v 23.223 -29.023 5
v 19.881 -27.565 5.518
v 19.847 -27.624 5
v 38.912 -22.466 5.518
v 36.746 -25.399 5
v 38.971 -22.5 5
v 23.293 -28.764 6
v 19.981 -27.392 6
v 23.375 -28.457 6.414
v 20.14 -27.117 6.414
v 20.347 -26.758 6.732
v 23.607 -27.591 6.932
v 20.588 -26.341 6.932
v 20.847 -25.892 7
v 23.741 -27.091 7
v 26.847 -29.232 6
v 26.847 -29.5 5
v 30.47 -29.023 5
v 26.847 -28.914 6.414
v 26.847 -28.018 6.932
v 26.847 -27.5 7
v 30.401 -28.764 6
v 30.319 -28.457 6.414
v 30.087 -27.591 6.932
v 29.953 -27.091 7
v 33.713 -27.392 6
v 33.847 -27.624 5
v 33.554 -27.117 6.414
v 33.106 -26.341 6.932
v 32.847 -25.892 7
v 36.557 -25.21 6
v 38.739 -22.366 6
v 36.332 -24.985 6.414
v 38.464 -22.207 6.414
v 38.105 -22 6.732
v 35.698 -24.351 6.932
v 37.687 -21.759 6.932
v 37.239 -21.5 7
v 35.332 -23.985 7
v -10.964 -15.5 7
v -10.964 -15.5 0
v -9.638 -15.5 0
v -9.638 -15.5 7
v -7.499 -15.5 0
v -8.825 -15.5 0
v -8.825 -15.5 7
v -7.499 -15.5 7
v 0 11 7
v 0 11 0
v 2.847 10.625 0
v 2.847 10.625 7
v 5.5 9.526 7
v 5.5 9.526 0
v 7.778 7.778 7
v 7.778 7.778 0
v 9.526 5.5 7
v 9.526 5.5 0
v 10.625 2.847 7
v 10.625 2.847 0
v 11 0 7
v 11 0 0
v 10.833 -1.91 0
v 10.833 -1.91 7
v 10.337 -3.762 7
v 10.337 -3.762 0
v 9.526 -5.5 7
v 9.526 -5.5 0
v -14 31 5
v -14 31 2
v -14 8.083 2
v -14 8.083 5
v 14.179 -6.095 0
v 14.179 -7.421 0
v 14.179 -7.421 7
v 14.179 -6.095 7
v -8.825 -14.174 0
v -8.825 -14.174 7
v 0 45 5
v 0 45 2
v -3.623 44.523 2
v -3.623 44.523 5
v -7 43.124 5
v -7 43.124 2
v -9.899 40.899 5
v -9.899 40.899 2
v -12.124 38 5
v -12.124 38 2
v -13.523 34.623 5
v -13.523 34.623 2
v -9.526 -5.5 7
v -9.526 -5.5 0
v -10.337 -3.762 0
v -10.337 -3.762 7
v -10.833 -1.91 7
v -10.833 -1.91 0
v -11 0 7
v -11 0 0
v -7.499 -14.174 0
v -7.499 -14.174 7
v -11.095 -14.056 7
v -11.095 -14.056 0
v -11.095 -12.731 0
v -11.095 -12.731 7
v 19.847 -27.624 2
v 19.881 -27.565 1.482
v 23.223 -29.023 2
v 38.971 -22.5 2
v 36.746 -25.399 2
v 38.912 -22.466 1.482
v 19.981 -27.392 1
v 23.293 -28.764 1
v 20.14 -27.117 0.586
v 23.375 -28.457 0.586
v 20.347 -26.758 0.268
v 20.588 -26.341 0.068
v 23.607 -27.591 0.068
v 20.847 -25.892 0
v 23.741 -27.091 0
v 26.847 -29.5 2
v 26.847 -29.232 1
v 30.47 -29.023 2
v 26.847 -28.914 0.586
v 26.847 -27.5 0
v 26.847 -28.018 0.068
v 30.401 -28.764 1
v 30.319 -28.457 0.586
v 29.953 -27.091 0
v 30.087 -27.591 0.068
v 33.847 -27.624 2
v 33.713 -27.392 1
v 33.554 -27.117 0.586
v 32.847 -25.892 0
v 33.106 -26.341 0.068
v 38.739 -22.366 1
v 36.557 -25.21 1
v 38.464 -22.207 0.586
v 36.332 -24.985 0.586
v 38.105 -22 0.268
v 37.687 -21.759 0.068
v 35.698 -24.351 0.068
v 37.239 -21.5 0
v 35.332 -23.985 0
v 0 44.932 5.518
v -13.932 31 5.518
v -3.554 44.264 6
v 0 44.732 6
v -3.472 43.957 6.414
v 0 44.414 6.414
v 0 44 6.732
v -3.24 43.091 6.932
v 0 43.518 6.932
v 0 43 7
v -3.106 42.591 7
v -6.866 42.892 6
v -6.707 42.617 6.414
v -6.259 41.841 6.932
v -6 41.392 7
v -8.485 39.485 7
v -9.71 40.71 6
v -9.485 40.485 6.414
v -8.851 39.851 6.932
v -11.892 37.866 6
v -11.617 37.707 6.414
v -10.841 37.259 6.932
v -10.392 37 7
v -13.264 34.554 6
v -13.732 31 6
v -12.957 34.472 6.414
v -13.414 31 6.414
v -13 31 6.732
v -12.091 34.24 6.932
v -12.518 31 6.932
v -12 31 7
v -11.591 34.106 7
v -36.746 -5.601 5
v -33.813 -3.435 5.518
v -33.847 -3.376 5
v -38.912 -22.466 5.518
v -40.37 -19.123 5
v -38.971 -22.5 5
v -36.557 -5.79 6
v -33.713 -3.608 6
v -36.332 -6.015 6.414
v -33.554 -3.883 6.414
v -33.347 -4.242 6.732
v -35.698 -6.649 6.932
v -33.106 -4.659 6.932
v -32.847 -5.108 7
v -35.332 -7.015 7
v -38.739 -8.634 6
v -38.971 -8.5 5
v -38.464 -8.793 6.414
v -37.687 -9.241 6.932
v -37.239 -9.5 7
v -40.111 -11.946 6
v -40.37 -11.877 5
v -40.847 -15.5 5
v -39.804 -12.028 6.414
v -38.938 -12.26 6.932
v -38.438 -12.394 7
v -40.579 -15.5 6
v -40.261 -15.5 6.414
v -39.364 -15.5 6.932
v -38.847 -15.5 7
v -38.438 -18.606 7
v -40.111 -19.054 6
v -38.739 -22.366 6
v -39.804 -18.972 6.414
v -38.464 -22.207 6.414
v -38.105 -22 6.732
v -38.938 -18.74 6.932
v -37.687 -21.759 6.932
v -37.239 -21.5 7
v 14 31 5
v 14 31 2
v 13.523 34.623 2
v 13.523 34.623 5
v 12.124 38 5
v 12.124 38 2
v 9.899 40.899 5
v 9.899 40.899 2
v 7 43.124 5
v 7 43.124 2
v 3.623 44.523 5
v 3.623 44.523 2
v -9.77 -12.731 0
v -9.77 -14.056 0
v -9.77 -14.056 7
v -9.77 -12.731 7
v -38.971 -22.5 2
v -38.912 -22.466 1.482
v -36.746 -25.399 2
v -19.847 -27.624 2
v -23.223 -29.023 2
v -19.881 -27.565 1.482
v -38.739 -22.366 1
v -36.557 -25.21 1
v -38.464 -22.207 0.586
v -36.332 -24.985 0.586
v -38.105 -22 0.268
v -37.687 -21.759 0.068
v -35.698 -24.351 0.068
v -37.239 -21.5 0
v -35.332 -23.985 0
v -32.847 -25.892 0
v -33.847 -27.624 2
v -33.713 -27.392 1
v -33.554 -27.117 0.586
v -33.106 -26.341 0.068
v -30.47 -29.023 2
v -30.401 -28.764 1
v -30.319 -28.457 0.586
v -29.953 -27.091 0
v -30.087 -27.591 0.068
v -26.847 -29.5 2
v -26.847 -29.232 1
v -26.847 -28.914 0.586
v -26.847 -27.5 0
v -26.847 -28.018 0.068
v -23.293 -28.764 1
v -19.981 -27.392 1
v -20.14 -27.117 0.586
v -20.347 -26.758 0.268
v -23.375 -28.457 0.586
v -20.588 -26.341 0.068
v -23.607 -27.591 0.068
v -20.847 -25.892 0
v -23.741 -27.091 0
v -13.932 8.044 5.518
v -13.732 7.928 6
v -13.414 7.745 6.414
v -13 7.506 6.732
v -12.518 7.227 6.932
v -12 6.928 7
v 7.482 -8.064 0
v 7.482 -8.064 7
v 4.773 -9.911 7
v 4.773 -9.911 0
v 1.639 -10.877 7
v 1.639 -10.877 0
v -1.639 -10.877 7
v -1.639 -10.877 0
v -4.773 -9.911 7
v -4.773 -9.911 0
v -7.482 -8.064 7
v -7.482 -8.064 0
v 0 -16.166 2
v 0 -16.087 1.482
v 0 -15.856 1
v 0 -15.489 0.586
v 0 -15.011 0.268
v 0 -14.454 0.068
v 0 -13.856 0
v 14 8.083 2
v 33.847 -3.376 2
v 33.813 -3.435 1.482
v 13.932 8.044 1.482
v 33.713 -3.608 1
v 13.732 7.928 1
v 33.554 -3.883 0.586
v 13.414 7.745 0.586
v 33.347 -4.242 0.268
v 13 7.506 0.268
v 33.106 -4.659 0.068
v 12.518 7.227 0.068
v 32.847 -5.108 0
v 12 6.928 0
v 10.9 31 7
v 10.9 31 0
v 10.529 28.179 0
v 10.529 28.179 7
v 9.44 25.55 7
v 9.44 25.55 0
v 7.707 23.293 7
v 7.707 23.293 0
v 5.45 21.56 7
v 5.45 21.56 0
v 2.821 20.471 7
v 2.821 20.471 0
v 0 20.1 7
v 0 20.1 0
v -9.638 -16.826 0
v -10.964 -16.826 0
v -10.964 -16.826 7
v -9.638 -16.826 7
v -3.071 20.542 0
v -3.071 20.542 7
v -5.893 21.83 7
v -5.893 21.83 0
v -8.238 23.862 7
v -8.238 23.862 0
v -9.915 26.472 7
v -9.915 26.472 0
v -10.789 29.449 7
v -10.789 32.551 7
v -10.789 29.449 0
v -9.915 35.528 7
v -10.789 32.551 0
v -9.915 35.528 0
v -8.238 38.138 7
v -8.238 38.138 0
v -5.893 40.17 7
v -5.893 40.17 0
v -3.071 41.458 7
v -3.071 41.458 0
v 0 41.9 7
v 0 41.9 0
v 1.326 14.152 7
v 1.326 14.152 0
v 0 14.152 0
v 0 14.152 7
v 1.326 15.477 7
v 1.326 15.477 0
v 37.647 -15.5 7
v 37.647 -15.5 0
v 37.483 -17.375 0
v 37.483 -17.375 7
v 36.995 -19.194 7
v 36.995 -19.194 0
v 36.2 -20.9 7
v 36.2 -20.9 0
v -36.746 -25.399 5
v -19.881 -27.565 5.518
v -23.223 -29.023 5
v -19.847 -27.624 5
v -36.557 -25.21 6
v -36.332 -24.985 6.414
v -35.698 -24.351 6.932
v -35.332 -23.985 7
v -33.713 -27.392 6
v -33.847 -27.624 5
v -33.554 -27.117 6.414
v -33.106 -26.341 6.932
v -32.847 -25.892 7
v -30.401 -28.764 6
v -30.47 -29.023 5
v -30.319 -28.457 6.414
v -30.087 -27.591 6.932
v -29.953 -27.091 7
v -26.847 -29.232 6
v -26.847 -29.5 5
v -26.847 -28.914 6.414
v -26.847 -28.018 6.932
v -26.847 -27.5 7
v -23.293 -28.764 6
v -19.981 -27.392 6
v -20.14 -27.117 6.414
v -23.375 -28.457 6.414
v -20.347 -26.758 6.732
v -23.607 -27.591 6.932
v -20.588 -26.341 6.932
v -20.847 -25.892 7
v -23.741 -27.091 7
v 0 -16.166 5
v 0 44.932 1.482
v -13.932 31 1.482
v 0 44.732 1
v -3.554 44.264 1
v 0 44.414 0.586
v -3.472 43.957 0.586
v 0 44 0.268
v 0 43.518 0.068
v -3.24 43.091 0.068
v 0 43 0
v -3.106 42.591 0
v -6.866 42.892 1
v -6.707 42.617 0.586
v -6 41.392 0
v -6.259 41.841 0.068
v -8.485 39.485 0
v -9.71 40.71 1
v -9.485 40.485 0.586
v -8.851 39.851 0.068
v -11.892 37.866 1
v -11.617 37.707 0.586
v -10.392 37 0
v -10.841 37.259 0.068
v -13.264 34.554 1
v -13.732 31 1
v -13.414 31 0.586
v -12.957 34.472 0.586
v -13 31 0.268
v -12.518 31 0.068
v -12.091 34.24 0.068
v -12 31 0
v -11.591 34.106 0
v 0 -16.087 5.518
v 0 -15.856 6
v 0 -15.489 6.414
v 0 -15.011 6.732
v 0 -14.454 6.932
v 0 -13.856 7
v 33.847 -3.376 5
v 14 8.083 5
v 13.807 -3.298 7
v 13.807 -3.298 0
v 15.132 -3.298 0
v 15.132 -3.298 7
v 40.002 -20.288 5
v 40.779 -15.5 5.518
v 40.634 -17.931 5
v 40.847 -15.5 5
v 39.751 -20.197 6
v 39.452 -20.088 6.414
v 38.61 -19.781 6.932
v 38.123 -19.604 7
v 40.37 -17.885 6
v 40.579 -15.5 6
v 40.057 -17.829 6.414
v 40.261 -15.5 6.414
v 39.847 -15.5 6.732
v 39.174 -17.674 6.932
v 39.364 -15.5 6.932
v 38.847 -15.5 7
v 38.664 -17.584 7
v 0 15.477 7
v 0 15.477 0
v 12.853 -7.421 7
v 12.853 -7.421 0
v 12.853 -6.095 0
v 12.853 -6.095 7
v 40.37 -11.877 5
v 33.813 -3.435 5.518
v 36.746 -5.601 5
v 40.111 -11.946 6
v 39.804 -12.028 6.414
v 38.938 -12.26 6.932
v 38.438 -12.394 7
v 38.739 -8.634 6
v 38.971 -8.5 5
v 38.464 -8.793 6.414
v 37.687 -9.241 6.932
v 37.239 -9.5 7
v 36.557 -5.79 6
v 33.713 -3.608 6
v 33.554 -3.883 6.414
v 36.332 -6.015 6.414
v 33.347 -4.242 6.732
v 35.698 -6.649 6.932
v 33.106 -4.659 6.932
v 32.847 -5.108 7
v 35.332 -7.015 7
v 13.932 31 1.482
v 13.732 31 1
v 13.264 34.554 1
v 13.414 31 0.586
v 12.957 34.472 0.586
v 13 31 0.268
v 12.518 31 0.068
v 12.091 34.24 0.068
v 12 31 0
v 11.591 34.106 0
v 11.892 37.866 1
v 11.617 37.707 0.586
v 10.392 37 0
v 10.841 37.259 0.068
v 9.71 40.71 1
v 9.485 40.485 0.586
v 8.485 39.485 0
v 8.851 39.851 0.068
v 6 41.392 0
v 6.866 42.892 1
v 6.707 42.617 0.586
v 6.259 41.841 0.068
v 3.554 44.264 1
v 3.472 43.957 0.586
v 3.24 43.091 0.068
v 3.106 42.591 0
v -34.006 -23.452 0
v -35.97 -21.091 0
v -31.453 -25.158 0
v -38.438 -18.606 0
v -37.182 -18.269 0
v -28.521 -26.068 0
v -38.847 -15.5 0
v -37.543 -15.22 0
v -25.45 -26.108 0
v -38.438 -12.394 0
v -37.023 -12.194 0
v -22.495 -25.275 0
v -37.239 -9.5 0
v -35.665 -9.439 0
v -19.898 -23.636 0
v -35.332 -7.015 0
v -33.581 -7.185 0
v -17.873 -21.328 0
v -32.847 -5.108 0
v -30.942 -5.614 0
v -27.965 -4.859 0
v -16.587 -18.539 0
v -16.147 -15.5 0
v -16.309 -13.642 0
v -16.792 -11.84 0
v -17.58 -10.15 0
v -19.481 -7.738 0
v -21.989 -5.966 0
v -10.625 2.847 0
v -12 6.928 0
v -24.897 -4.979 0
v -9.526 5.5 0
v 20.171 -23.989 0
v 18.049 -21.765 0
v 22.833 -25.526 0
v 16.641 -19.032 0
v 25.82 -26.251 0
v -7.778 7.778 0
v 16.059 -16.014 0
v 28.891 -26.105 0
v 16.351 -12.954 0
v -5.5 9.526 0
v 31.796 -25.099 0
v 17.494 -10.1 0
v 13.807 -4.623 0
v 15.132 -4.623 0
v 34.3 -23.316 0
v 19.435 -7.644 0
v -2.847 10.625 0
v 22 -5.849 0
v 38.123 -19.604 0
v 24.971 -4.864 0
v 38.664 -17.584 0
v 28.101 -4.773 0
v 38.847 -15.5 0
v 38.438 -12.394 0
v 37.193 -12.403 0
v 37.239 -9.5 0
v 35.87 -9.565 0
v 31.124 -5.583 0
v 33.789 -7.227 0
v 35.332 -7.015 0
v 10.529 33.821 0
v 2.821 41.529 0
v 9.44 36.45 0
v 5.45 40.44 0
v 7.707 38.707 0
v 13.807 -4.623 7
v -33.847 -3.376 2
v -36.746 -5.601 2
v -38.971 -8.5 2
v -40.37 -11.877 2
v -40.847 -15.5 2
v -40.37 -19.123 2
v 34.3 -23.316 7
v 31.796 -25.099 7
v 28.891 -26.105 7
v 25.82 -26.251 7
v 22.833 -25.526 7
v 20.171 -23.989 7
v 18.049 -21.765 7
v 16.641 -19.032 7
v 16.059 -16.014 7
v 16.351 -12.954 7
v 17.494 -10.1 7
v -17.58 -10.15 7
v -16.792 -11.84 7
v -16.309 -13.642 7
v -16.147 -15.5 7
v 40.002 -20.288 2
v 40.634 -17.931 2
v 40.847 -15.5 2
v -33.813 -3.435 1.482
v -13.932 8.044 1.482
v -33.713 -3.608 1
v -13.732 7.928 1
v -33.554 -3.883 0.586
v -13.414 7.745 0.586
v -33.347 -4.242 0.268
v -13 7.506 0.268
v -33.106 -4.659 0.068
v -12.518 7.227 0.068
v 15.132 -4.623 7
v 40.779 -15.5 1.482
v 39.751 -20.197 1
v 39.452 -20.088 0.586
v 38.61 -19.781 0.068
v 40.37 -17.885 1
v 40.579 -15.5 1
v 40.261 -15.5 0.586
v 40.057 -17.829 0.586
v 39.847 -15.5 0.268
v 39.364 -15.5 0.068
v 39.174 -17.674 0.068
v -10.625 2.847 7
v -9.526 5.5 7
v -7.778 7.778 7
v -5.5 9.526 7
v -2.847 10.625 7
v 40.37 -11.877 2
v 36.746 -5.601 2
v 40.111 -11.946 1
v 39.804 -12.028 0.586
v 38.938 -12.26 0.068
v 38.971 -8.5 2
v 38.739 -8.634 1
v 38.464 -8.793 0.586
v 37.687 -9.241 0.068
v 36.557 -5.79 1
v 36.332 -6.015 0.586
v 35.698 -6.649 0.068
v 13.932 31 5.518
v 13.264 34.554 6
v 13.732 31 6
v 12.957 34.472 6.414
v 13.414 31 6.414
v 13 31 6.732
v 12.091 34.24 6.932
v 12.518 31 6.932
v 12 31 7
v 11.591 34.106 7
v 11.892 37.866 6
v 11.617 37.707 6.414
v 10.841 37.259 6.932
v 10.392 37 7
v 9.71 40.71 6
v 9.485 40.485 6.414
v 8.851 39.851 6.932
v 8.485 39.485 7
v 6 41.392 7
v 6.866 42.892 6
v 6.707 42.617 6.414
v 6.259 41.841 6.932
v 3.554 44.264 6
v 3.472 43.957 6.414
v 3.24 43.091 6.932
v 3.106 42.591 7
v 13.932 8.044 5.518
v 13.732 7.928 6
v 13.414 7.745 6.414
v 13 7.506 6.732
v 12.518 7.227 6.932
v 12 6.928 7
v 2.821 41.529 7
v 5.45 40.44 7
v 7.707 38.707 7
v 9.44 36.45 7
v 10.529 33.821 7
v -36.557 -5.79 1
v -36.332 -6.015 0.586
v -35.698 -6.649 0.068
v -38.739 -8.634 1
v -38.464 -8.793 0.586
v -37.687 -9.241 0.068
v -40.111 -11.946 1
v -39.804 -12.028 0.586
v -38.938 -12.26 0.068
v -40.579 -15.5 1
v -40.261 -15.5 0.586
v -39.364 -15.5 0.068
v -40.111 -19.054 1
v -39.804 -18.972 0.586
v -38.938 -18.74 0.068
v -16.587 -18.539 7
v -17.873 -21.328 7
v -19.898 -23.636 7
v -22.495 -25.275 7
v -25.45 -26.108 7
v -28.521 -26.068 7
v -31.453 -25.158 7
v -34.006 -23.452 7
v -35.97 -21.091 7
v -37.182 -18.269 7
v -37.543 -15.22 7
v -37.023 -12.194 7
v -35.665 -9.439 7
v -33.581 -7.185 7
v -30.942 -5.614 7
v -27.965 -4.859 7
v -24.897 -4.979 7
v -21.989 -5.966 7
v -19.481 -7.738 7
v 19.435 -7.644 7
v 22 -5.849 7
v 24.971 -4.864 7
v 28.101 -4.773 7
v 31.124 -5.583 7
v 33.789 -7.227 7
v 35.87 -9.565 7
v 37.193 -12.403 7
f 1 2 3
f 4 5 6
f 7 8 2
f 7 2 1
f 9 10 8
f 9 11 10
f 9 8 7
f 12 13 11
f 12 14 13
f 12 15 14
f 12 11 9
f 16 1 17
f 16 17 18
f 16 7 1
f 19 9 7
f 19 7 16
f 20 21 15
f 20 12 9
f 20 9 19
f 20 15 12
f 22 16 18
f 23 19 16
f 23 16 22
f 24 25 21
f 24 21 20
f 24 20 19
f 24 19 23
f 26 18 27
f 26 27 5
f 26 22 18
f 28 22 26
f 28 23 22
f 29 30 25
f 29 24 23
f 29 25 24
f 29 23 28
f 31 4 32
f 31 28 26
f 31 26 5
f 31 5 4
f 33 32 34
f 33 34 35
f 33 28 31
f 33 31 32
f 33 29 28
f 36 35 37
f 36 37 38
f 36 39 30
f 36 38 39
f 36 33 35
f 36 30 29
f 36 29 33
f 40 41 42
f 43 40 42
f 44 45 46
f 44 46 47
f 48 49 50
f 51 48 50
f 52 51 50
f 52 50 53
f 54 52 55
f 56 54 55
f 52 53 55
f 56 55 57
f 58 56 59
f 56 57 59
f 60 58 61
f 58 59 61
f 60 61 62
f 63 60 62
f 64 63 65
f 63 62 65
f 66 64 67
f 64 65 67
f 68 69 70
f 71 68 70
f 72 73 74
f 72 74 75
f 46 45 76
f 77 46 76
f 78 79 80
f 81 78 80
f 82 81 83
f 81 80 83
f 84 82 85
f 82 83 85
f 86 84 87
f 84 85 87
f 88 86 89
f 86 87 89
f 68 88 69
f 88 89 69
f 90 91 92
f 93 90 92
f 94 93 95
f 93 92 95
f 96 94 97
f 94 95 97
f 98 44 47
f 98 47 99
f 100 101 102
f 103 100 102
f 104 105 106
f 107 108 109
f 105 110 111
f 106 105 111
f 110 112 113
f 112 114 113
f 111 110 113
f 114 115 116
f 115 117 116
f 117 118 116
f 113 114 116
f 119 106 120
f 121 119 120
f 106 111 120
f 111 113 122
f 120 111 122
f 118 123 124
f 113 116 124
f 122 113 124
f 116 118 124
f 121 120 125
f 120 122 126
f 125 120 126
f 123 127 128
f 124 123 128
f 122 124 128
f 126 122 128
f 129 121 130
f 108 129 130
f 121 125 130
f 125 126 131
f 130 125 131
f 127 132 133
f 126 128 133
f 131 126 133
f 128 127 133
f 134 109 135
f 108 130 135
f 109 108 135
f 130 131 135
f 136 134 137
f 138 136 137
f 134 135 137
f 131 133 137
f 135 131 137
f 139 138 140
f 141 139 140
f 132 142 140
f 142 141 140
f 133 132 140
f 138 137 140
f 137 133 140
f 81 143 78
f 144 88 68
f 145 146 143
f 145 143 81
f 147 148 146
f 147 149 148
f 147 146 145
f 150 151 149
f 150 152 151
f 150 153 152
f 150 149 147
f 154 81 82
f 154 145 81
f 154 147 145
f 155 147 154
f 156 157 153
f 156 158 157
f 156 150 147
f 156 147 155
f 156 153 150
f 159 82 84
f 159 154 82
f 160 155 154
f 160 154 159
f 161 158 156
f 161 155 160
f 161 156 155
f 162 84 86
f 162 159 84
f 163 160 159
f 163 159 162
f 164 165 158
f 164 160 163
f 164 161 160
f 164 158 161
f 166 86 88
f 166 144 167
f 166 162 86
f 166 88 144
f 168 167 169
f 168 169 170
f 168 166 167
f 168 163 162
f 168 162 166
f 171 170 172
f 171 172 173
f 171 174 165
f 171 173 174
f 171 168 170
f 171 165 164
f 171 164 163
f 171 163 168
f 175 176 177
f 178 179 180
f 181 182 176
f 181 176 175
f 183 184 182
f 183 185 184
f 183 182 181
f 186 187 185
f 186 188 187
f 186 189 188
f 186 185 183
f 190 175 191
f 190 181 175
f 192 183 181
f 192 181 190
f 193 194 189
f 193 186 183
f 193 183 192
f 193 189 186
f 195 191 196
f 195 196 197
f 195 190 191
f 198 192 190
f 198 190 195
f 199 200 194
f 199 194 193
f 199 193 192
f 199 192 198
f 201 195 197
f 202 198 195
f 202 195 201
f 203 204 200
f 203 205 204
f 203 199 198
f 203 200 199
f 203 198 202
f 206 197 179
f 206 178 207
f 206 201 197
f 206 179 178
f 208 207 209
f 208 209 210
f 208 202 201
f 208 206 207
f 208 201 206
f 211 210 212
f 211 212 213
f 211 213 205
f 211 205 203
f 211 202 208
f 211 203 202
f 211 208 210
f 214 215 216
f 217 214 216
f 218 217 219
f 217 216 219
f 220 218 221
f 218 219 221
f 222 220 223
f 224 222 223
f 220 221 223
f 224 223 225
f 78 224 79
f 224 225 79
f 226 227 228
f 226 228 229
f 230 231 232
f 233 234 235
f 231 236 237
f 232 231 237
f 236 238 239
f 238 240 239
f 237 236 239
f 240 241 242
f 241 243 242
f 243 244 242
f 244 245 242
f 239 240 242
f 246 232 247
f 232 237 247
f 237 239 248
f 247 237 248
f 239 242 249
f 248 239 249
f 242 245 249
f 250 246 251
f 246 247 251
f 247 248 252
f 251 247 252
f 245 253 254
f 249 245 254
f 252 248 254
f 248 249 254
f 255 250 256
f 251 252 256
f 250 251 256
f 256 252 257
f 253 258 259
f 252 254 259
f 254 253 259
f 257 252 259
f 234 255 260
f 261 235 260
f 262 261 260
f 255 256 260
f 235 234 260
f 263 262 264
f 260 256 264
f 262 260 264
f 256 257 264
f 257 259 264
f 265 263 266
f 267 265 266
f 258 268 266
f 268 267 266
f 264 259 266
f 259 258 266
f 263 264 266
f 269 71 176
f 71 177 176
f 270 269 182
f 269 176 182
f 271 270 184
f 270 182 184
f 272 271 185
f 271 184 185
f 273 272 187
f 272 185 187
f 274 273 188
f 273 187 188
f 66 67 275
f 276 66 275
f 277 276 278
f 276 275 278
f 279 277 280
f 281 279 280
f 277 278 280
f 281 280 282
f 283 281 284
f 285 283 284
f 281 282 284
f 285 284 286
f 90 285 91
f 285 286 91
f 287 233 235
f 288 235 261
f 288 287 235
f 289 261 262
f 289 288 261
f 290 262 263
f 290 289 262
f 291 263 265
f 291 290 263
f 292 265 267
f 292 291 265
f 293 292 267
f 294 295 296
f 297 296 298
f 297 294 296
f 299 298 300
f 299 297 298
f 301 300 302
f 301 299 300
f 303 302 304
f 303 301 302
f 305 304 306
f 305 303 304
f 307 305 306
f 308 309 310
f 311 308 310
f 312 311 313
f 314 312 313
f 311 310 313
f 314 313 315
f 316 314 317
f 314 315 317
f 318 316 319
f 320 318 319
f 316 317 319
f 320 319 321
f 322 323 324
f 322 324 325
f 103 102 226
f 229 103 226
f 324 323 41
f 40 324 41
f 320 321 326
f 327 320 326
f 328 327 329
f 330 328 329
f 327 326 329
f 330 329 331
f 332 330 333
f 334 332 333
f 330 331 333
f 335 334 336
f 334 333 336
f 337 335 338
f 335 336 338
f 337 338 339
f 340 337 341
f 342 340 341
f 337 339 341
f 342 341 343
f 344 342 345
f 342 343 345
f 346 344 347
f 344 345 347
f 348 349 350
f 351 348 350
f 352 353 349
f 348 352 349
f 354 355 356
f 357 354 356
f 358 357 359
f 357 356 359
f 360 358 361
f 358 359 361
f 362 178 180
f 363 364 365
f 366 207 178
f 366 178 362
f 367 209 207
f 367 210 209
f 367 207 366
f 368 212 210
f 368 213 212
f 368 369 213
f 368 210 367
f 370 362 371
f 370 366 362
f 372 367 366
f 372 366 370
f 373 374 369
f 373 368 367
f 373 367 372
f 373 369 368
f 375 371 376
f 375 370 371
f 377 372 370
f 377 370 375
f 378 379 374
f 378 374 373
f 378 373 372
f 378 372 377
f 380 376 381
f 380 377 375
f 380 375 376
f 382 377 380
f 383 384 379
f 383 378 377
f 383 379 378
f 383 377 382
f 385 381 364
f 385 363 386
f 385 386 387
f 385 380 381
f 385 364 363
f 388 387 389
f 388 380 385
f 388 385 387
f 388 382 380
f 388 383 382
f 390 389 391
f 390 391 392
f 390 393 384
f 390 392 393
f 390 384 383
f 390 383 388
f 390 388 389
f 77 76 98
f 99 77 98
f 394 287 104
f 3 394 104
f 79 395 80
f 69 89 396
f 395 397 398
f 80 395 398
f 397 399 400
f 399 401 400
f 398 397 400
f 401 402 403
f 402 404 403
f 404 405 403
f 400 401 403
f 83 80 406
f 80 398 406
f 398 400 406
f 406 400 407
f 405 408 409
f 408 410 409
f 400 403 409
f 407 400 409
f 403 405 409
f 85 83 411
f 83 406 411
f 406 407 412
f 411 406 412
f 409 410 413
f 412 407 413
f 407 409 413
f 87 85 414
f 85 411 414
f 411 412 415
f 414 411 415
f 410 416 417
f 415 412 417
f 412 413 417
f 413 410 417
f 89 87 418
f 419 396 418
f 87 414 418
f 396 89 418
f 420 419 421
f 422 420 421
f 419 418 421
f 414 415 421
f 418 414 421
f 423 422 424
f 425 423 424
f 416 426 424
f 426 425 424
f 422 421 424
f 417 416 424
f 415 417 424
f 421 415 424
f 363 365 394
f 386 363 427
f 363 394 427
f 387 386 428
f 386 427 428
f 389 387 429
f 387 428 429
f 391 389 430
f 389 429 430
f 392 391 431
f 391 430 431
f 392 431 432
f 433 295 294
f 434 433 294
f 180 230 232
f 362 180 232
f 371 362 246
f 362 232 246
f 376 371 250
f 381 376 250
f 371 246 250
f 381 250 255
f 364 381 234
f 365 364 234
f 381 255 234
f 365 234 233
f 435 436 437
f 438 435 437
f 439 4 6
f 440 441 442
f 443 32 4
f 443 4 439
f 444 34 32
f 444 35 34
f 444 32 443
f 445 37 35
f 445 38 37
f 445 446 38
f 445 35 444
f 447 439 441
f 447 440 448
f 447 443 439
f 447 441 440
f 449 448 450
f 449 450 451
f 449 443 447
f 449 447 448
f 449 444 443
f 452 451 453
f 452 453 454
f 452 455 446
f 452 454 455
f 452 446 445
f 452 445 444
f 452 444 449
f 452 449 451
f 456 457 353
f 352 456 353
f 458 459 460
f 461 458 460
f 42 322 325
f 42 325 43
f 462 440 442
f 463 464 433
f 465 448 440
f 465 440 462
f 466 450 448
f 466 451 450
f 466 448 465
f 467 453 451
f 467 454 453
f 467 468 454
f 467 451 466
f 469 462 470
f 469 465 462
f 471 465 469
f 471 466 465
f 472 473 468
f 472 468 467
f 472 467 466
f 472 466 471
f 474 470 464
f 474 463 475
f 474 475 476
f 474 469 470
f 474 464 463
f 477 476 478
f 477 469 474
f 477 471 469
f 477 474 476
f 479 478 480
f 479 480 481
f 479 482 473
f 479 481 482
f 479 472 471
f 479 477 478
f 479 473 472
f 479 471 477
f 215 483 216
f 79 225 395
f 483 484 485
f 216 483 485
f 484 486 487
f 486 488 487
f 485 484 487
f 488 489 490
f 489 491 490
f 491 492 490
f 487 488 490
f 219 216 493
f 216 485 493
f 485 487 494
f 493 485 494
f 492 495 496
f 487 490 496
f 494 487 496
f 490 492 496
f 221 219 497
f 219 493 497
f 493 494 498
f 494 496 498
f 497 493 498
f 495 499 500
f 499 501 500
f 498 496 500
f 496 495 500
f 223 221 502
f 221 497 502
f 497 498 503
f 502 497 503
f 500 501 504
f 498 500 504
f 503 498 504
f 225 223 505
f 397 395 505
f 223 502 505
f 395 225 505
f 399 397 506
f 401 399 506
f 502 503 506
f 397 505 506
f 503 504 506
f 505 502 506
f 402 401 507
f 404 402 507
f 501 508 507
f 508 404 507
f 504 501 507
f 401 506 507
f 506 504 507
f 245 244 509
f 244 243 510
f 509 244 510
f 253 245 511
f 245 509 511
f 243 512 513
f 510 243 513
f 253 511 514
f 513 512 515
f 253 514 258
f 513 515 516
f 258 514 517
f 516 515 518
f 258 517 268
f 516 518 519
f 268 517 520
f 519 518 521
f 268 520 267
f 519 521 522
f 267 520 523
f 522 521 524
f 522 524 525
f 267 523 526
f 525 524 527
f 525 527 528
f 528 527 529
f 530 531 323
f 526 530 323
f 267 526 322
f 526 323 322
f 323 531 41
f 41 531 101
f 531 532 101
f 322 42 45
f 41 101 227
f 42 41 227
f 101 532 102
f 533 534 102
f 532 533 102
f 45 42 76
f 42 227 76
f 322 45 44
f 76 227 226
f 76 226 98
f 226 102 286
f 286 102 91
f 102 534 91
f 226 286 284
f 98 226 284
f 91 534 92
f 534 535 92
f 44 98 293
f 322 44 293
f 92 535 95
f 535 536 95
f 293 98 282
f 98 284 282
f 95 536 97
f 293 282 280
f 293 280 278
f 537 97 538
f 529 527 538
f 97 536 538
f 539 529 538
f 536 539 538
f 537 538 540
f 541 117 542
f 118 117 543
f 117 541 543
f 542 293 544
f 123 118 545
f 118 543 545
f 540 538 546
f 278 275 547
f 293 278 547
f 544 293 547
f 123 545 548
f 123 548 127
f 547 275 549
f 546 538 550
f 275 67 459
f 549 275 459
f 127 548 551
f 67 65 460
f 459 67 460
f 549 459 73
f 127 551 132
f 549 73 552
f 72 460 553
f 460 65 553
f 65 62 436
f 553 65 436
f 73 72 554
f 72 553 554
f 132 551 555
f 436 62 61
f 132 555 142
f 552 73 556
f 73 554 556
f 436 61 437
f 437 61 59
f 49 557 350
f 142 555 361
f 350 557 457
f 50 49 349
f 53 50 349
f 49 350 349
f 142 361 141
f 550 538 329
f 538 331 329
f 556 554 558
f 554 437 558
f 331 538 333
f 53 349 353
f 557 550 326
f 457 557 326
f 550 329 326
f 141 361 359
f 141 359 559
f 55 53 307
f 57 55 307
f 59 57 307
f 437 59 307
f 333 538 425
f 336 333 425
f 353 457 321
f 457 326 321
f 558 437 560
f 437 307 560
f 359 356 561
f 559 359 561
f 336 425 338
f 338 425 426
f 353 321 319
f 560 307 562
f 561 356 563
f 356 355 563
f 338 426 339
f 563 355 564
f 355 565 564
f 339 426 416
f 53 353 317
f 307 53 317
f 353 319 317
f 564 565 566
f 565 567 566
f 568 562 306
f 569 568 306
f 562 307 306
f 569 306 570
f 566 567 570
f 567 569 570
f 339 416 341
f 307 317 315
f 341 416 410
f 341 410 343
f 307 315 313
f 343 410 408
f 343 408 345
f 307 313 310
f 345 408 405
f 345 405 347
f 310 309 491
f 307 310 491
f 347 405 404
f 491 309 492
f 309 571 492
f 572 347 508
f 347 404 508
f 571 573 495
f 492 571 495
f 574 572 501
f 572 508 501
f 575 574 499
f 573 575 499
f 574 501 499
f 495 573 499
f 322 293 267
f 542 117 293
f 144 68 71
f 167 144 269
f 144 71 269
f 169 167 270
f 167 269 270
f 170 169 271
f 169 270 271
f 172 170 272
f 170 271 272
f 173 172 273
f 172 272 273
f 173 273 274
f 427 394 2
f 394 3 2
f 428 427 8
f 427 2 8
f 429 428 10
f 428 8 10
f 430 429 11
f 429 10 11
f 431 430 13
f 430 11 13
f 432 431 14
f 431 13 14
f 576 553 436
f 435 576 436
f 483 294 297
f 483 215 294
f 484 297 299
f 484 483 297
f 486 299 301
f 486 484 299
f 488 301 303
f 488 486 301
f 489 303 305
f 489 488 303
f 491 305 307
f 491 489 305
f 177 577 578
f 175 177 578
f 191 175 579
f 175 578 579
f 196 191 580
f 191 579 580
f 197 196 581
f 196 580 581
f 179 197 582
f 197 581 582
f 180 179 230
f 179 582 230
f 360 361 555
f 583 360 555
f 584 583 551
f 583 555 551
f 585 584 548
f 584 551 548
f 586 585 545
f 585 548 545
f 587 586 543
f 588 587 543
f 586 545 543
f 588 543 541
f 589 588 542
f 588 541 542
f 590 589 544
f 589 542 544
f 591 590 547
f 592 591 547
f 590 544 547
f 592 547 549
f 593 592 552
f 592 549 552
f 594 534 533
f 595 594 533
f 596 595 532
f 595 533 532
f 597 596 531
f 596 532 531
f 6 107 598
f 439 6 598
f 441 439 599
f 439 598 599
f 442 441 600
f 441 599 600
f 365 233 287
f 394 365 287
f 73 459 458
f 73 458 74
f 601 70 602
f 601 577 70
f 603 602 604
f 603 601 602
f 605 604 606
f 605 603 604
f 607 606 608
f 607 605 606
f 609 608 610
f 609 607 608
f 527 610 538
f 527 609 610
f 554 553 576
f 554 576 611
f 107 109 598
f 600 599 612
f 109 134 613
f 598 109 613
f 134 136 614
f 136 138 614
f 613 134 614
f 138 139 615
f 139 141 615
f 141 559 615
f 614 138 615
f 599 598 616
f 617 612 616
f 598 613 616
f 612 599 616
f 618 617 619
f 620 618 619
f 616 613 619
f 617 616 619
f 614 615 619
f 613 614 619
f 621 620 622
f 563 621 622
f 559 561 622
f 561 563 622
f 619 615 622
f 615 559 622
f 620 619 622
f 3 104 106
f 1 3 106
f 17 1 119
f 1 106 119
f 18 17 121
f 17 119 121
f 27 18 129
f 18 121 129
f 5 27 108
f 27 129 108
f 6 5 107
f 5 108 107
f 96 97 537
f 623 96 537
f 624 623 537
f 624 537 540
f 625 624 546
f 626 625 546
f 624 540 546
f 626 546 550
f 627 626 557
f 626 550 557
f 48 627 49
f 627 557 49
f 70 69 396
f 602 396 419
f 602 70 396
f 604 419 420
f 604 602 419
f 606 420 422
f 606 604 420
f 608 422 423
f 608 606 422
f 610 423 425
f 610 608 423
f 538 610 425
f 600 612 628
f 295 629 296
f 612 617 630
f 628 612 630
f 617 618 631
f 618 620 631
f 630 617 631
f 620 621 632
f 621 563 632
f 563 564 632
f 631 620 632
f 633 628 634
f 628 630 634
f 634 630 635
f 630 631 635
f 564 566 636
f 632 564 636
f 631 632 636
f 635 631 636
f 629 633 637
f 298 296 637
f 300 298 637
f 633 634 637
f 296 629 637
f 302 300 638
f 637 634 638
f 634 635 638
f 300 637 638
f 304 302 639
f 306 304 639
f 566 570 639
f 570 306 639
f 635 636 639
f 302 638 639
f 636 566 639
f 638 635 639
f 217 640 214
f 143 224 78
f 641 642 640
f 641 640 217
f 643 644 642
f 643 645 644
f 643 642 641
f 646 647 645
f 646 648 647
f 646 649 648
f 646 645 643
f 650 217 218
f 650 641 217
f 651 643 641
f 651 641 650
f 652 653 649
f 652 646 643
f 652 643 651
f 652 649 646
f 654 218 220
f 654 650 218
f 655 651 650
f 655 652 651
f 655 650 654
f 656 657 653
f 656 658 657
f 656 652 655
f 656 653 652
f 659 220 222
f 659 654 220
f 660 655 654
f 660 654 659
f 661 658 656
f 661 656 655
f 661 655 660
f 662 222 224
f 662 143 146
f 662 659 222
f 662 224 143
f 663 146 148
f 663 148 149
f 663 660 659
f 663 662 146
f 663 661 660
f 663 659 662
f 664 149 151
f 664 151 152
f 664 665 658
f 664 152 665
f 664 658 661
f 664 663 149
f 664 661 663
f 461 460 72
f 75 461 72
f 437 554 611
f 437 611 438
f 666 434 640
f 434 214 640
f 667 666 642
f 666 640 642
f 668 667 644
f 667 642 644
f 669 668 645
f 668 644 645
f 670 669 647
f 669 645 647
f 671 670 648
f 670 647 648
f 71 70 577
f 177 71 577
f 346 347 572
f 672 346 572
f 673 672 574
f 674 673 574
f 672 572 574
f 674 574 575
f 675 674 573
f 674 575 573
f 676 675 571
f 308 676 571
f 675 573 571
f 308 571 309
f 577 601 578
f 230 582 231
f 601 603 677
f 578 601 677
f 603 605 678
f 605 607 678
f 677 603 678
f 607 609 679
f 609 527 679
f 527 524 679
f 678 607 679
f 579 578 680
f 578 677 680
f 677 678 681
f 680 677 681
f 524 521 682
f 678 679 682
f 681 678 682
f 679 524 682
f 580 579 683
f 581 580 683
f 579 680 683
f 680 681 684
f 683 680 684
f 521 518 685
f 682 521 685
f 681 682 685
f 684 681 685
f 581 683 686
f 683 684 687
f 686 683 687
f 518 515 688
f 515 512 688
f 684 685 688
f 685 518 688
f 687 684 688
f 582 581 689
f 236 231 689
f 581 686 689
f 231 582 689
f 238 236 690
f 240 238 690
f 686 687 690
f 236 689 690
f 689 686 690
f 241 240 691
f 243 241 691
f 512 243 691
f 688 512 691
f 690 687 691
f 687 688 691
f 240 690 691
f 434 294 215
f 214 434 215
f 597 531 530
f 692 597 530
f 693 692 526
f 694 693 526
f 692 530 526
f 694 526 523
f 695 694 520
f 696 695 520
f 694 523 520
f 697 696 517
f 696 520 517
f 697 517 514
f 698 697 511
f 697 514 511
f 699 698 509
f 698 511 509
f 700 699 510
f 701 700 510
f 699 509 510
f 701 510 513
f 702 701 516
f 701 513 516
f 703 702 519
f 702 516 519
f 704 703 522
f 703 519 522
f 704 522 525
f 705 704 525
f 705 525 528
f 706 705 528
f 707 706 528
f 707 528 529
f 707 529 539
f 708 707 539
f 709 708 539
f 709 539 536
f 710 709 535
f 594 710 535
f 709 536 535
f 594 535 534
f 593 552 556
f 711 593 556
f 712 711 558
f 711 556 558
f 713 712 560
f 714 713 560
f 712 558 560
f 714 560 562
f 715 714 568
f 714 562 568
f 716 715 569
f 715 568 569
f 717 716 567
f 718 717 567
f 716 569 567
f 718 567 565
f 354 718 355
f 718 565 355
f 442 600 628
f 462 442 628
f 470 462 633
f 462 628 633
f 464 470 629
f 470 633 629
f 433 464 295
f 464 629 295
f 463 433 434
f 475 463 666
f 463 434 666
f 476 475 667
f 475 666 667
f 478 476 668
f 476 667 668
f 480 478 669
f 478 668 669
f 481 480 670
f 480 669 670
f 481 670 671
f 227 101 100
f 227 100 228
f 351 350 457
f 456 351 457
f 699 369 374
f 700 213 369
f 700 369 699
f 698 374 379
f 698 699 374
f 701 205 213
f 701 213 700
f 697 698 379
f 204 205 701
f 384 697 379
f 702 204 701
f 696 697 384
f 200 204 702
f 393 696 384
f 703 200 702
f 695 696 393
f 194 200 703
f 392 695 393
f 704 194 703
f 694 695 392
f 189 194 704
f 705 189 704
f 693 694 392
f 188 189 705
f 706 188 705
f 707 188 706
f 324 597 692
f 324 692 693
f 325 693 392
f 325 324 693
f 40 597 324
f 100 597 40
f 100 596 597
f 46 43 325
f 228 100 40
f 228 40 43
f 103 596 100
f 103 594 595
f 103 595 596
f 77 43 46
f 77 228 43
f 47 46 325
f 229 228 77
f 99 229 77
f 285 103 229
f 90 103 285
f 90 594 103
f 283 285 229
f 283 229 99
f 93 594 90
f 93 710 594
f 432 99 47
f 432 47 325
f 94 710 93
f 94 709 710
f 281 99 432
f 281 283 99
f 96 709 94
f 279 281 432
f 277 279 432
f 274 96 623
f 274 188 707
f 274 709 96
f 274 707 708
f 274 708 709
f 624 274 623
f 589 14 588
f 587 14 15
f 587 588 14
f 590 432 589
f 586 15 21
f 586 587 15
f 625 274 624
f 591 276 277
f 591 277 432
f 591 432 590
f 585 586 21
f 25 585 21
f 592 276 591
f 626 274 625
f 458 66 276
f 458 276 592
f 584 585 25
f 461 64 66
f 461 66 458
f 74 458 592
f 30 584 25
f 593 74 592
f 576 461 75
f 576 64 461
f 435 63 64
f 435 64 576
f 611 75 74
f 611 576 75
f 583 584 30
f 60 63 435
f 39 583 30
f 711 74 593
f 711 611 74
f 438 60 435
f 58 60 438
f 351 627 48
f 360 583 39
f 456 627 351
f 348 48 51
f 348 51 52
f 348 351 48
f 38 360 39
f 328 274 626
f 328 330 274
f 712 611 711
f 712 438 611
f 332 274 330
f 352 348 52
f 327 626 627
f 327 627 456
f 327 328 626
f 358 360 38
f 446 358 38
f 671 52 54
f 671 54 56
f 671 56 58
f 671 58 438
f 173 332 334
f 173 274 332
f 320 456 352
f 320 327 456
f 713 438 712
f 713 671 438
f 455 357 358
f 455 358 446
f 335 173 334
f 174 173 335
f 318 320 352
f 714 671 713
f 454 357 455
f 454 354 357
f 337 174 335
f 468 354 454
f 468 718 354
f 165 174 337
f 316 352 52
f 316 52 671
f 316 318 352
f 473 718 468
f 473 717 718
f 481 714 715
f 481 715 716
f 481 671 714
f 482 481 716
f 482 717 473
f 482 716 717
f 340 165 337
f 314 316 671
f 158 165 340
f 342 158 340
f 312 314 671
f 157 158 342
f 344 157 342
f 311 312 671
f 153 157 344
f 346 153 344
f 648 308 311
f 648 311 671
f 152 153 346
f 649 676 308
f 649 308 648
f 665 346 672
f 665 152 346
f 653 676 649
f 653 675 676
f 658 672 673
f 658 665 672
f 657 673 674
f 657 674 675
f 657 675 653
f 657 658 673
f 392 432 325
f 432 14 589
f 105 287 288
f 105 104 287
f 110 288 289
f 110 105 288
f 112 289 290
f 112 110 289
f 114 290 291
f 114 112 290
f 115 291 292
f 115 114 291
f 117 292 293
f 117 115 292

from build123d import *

# Parameters (mm, degrees)
F0_W     = 1.3256371551
F0_H     = 1.3256371551
F1_DEPTH = 7
F2_R     = 2


with BuildPart() as f1:
    # F0 (on Top) → F1 (new body)
    with BuildSketch(Plane.XY):
        with BuildLine():
            Line((0, 20.1), (0, 17))
            ThreePointArc((0, 17), (9.8994949366, 21.1005050634), (14, 31))
            ThreePointArc((14, 31), (9.8994949366, 40.8994949366), (0, 45))
            Line((0, 45), (0, 41.9))
            ThreePointArc((0, 41.9), (7.7074639149, 38.7074639149), (10.9, 31))
            ThreePointArc((10.9, 31), (7.7074639149, 23.2925360851), (0, 20.1))
        make_face()
        with BuildLine():
            ThreePointArc((-14, 31), (-9.8994949366, 21.1005050634), (0, 17))
            Line((0, 17), (0, 20.1))
            ThreePointArc((0, 20.1), (-10.9, 31), (0, 41.9))
            Line((0, 41.9), (0, 45))
            ThreePointArc((0, 45), (-9.8994949366, 40.8994949366), (-14, 31))
        make_face()
        with BuildLine():
            Line((0, 11), (0, 14.1517119482))
            Line((0, 14.1517119482), (0, 15.4773491033))
            Line((0, 15.4773491033), (0, 17))
            ThreePointArc((0, 17), (-9.8994949366, 21.1005050634), (-14, 31))
            Line((-14, 31), (-14, 8.0829037687))
            Line((-14, 8.0829037687), (-14, 0))
            Line((-14, 0), (-11, 0))
            ThreePointArc((-11, 0), (-7.7781745931, 7.7781745931), (0, 11))
        make_face()
        with BuildLine():
            Line((1.3256371551, 14.1517119482), (0, 14.1517119482))
            Line((0, 14.1517119482), (0, 11))
            ThreePointArc((0, 11), (7.7781745931, 7.7781745931), (11, 0))
            Line((11, 0), (14, 0))
            Line((14, 0), (14, 8.0829037687))
            Line((14, 8.0829037687), (14, 31))
            ThreePointArc((14, 31), (9.8994949366, 21.1005050634), (0, 17))
            Line((0, 17), (0, 15.4773491033))
            Line((0, 15.4773491033), (1.3256371551, 15.4773491033))
            Line((1.3256371551, 15.4773491033), (1.3256371551, 14.1517119482))
        make_face()
        with BuildLine():
            Line((14, 0), (11, 0))
            ThreePointArc((11, 0), (10.6251840892, -2.8470094961), (9.5262794416, -5.5))
            Line((9.5262794416, -5.5), (12.8533530208, -7.4208868265))
            Line((12.8533530208, -7.4208868265), (14.7224318643, -8.5))
            ThreePointArc((14.7224318643, -8.5), (23.2233210418, -1.9770383902), (33.8467877969, -3.3756445084))
            Line((33.8467877969, -3.3756445084), (14, 8.0829037687))
            Line((14, 8.0829037687), (14, 0))
        make_face()
        with Locations((13.5161715983, -6.758068249)):
            Rectangle(F0_W, F0_H, mode=Mode.SUBTRACT)
        with Locations((14.4693469893, -3.9606061499)):
            Rectangle(F0_W, F0_H, mode=Mode.SUBTRACT)
        with BuildLine():
            Line((12.8533530208, -7.4208868265), (9.5262794416, -5.5))
            ThreePointArc((9.5262794416, -5.5), (0, -11), (-9.5262794416, -5.5))
            Line((-9.5262794416, -5.5), (-14, -8.0829037687))
            Line((-14, -8.0829037687), (0, -16.1658075373))
            Line((0, -16.1658075373), (19.8467879874, -27.6243559244))
            ThreePointArc((19.8467879874, -27.6243559244), (13.3238260195, -19.1234668936), (14.7224318643, -8.5))
            Line((14.7224318643, -8.5), (12.8533530208, -7.4208868265))
        make_face()
        with BuildLine():
            ThreePointArc((-9.5262794416, -5.5), (-10.6251840892, -2.8470094961), (-11, 0))
            Line((-11, 0), (-14, 0))
            Line((-14, 0), (-14, 8.0829037687))
            Line((-14, 8.0829037687), (-33.8467875831, -3.375644385))
            ThreePointArc((-33.8467875831, -3.375644385), (-23.2233209225, -1.9770384221), (-14.7224318643, -8.5))
            Line((-14.7224318643, -8.5), (-14, -8.0829037687))
            Line((-14, -8.0829037687), (-9.5262794416, -5.5))
        make_face()
        with BuildLine():
            Line((0, -16.1658075373), (-14, -8.0829037687))
            Line((-14, -8.0829037687), (-14.7224318643, -8.5))
            ThreePointArc((-14.7224318643, -8.5), (-13.3238259493, -11.8765333686), (-12.8467875173, -15.5))
            ThreePointArc((-12.8467875173, -15.5), (-14.7224317836, -22.4999998602), (-19.8467872378, -27.6243554916))
            Line((-19.8467872378, -27.6243554916), (0, -16.1658075373))
        make_face()
        with Locations((-10.3011047203, -16.1628185775)):
            Rectangle(F0_W, F0_H, mode=Mode.SUBTRACT)
        with Locations((-8.161916424, -14.8371814225)):
            Rectangle(F0_W, F0_H, mode=Mode.SUBTRACT)
        with Locations((-10.4326661411, -13.3934514332)):
            Rectangle(F0_W, F0_H, mode=Mode.SUBTRACT)
        with BuildLine():
            ThreePointArc((-12.8467875173, -15.5), (-13.3238259493, -11.8765333686), (-14.7224318643, -8.5))
            Line((-14.7224318643, -8.5), (-17.5803156968, -10.15))
            ThreePointArc((-17.5803156968, -10.15), (-16.511381176, -12.7306362174), (-16.1467875173, -15.5))
            ThreePointArc((-16.1467875173, -15.5), (-24.0774237347, -25.8354063413), (-36.1132593378, -20.85))
            Line((-36.1132593378, -20.85), (-38.9711431703, -22.5))
            ThreePointArc((-38.9711431703, -22.5), (-30.4702539929, -29.0229616098), (-19.8467872378, -27.6243554916))
            ThreePointArc((-19.8467872378, -27.6243554916), (-14.7224317836, -22.4999998602), (-12.8467875173, -15.5))
        make_face()
        with BuildLine():
            ThreePointArc((-14.7224318643, -8.5), (-23.2233209225, -1.9770384221), (-33.8467875831, -3.375644385))
            ThreePointArc((-33.8467875831, -3.375644385), (-40.3697490952, -11.8765334052), (-38.9711431703, -22.5))
            Line((-38.9711431703, -22.5), (-36.1132593378, -20.85))
            ThreePointArc((-36.1132593378, -20.85), (-32.1967875173, -6.2335281795), (-17.5803156968, -10.15))
            Line((-17.5803156968, -10.15), (-14.7224318643, -8.5))
        make_face()
        with BuildLine():
            ThreePointArc((40.8467875173, -15.5), (38.971143251, -8.5000001398), (33.8467877969, -3.3756445084))
            ThreePointArc((33.8467877969, -3.3756445084), (23.2233210418, -1.9770383902), (14.7224318643, -8.5))
            Line((14.7224318643, -8.5), (17.4937131564, -10.1))
            ThreePointArc((17.4937131564, -10.1), (29.6420332044, -5.0680010761), (37.6467875173, -15.5))
            ThreePointArc((37.6467875173, -15.5), (37.2787864412, -18.2952456871), (36.1998618782, -20.9))
            Line((36.1998618782, -20.9), (38.9711431703, -22.5))
            ThreePointArc((38.9711431703, -22.5), (40.3697490854, -19.1234666314), (40.8467875173, -15.5))
        make_face()
        with BuildLine():
            Line((17.4937131564, -10.1), (14.7224318643, -8.5))
            ThreePointArc((14.7224318643, -8.5), (13.3238260195, -19.1234668936), (19.8467879874, -27.6243559244))
            ThreePointArc((19.8467879874, -27.6243559244), (30.4702544109, -29.0229614978), (38.9711431703, -22.5))
            Line((38.9711431703, -22.5), (36.1998618782, -20.9))
            ThreePointArc((36.1998618782, -20.9), (21.4467875173, -24.8530743609), (17.4937131564, -10.1))
        make_face()
    extrude(amount=F1_DEPTH)

    # F2
    f2_edges = [f1.edges().sort_by_distance(p)[0] for p in [
        (-14, 19.541452, 7),
        (0, 45, 7),
        (-23.923394, 2.35363, 7),
        (-38.971143, -22.5, 7),
        (-9.923394, -21.895082, 7),
        (9.923394, -21.895082, 7),
        (38.971143, -22.5, 7),
        (23.923394, 2.35363, 7),
        (14, 19.541452, 7),
        (-9.923394, -21.895082, 0),
        (-38.971143, -22.5, 0),
        (9.923394, -21.895082, 0),
        (38.971143, -22.5, 0),
        (23.923394, 2.35363, 0),
        (14, 19.541452, 0),
        (0, 45, 0),
    ]]
    fillet(f2_edges, radius=F2_R)


solid = f1.part
